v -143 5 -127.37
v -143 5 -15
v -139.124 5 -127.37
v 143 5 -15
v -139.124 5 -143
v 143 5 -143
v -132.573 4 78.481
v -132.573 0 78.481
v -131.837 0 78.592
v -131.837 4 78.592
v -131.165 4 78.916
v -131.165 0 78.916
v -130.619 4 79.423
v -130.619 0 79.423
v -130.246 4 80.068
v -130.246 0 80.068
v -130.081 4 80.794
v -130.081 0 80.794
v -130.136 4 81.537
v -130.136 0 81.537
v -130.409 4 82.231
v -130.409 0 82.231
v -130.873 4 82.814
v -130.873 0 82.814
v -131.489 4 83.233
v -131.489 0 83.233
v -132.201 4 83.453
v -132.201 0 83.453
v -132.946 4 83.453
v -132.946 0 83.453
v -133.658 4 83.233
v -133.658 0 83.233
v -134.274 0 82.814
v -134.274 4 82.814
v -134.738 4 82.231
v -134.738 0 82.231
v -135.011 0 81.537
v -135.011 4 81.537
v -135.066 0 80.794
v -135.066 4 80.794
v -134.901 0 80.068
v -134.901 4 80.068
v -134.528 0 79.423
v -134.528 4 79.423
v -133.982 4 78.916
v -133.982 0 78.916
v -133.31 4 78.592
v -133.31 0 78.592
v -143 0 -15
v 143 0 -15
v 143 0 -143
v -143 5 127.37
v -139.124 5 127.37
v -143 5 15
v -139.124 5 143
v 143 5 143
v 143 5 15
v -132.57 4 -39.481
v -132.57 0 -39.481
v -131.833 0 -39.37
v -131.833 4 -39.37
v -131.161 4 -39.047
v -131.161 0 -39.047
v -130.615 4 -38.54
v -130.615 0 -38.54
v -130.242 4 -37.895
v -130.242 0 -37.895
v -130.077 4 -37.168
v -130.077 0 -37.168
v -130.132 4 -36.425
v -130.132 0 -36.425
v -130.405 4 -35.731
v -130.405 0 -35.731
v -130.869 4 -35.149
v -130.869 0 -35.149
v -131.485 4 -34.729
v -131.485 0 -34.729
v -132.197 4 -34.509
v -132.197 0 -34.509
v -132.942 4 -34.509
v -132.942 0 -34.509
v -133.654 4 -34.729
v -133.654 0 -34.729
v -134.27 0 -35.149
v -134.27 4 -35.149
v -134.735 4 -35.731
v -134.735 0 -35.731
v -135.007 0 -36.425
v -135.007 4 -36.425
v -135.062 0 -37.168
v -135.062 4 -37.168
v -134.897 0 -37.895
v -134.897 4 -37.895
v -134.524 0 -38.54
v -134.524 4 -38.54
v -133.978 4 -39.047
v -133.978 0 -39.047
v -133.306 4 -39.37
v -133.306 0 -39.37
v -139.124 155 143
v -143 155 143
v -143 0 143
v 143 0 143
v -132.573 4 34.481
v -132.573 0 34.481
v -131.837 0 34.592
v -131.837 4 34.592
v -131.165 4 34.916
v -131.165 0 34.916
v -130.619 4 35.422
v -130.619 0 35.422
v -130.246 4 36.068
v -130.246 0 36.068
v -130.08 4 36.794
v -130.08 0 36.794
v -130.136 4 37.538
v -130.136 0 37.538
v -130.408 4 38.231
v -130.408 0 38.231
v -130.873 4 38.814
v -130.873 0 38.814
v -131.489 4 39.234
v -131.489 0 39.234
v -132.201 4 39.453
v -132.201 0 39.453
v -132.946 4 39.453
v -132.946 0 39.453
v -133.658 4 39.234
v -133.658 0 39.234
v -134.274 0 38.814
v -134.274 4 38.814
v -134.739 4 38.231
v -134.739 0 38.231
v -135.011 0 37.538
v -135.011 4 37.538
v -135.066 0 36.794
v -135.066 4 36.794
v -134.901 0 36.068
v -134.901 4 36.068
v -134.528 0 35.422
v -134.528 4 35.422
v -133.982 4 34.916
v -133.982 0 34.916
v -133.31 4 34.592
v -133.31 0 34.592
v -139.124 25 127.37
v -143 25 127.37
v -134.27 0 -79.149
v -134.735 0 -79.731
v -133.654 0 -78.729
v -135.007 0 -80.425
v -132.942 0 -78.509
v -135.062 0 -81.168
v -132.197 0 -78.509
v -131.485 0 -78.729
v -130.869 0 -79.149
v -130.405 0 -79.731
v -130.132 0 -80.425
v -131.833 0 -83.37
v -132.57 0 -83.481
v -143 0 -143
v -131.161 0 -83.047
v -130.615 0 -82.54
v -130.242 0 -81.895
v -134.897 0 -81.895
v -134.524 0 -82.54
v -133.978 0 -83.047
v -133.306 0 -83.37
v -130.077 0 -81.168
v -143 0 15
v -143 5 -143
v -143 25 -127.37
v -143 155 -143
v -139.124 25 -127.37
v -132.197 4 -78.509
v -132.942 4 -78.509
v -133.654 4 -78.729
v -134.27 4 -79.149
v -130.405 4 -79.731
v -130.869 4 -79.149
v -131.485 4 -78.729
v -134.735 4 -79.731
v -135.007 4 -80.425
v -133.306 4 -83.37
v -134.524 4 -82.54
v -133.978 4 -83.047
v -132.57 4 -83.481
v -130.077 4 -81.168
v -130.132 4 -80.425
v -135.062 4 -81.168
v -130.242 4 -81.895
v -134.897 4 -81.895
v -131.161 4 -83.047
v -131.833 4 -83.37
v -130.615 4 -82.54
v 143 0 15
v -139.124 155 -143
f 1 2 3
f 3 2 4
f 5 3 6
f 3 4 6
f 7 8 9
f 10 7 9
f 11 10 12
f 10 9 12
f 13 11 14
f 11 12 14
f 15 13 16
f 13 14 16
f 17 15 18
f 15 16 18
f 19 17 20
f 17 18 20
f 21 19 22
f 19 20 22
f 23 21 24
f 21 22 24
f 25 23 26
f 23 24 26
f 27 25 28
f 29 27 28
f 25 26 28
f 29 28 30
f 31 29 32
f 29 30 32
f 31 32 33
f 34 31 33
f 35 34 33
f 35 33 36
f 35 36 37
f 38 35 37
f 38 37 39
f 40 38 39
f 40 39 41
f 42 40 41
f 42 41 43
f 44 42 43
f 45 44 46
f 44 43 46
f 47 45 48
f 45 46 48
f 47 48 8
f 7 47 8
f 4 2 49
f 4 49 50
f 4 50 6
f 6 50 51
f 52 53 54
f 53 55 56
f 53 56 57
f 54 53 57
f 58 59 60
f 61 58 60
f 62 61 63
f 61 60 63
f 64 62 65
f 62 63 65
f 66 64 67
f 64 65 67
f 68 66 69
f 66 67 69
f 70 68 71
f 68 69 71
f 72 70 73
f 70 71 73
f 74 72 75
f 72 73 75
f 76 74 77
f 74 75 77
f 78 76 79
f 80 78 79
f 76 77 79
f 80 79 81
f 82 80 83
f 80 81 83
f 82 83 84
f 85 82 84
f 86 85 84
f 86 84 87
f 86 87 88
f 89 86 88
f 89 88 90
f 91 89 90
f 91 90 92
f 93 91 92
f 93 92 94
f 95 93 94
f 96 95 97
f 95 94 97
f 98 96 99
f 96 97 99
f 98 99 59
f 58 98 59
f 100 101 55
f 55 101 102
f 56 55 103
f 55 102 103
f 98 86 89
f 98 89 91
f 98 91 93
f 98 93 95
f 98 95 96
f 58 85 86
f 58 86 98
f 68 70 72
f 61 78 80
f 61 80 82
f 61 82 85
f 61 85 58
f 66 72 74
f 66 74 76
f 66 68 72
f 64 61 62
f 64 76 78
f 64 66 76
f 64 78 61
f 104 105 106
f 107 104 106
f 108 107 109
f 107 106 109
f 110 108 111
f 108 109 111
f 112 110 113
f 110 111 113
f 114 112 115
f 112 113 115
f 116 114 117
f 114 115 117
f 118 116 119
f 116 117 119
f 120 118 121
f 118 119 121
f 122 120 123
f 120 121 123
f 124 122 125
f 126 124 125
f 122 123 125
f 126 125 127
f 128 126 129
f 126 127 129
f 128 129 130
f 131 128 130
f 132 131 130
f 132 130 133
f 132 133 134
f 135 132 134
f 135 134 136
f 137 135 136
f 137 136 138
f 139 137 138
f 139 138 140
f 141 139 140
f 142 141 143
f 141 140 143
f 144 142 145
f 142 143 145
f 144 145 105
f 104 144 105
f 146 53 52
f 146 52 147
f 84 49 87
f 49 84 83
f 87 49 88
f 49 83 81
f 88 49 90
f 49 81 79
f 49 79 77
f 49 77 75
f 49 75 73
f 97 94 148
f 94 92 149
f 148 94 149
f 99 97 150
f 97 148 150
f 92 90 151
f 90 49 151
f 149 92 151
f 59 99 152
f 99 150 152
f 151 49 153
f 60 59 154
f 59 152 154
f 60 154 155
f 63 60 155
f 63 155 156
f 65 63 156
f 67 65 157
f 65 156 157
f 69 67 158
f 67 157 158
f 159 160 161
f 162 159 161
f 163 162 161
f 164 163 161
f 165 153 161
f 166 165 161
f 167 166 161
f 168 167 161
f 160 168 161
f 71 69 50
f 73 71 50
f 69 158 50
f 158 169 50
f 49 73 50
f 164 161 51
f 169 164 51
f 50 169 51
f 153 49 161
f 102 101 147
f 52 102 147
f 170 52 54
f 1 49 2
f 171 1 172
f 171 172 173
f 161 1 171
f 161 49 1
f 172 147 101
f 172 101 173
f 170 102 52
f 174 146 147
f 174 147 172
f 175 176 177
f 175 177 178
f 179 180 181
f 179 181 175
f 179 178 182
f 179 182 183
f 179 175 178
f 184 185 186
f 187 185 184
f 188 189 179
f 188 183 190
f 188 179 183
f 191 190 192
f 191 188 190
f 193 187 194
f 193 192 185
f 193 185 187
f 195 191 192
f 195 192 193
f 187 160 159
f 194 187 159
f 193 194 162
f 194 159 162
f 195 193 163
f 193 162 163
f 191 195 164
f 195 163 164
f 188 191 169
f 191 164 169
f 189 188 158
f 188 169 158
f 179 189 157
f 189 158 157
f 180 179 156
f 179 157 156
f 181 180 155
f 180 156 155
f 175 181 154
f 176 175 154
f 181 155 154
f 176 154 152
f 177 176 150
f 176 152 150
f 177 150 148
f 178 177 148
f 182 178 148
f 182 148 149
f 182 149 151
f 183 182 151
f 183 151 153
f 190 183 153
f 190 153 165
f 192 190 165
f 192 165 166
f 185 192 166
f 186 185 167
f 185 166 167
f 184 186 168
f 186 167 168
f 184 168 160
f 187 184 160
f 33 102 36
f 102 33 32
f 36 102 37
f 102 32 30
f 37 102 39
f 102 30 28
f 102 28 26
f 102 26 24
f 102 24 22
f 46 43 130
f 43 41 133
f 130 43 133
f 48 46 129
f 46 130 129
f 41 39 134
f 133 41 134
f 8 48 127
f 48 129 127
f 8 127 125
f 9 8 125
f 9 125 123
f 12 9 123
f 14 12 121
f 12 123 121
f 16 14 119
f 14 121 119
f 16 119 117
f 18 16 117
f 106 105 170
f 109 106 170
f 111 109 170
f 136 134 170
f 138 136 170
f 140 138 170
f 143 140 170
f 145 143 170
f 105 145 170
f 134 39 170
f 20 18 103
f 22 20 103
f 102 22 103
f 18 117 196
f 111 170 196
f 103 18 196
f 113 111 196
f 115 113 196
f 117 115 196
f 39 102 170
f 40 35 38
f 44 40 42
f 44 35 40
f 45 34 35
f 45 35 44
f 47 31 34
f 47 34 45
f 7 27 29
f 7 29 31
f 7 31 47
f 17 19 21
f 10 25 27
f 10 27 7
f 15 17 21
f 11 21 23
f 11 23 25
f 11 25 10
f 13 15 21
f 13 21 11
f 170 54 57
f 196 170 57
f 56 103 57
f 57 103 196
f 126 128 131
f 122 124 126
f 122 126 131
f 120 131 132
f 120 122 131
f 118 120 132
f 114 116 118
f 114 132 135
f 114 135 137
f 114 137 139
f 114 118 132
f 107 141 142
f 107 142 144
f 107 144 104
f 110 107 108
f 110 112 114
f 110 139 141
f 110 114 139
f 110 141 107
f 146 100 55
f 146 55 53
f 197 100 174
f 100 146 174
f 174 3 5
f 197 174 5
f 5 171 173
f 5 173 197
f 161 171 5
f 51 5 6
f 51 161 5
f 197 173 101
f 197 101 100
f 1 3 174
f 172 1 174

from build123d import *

# Parameters (mm, degrees)
SKETCH1_W           = 286
SKETCH1_H           = 286
BOSS_EXTRUDE1_DEPTH = 5
SKETCH4_R           = 2.499853141
SKETCH4_R_2         = 2.499999298
SKETCH4_R_3         = 2.499896797
CUT_EXTRUDE1_DEPTH  = 4
SKETCH5_W           = 286
SKETCH5_H           = 30
CUT_EXTRUDE2_DEPTH  = 203.29434001
SKETCH6_W           = 3.876379433
SKETCH6_H           = 286
BOSS_EXTRUDE2_DEPTH = 150
SKETCH7_W           = 254.74073144
SKETCH7_H           = 20
CUT_EXTRUDE3_DEPTH  = 353.232504579


with BuildPart() as part:
    # Sketch1 → Boss-Extrude1 (new body)
    with BuildSketch(Plane(origin=(0, 0, 0), x_dir=(1, 0, 0), z_dir=(0, 1, 0))):
        Rectangle(SKETCH1_W, SKETCH1_H)
    extrude(amount=BOSS_EXTRUDE1_DEPTH)

    # Sketch4 → Cut-Extrude1 (cut)
    with BuildSketch(Plane(origin=(0, 0, 0), x_dir=(-1, 0, 0), z_dir=(0, -1, 0))):
        with Locations(Location((132.573463178, -80.981198503, 0), (0, 0, 90))):
            Circle(SKETCH4_R)
        with Locations(Location((132.573463178, -36.981198619, 0), (0, 0, 90))):
            Circle(SKETCH4_R_2)
        with Locations(Location((132.569572232, 36.981198719, 0), (0, 0, 90))):
            Circle(SKETCH4_R_3)
        with Locations(Location((132.569572232, 80.981198603, 0), (0, 0, 90))):
            Circle(SKETCH4_R_3)
    extrude(amount=-CUT_EXTRUDE1_DEPTH, mode=Mode.SUBTRACT)

    # Sketch5 → Cut-Extrude2 (cut, through all)
    with BuildSketch(Plane(origin=(0, 5, 0), x_dir=(1, 0, 0), z_dir=(0, 1, 0))):
        Rectangle(SKETCH5_W, SKETCH5_H)
    extrude(amount=-CUT_EXTRUDE2_DEPTH, mode=Mode.SUBTRACT)


with BuildPart() as cut_extrude2_piece_1:
    # of the separate pieces the step leaves, piece 1, a body of its own (cut_extrude2_pieces)
    add(part.part.solids().sort_by_distance((-143, 0, -143))[0])



with BuildPart() as cut_extrude2_piece_2:
    # of the separate pieces the step leaves, piece 2, a body of its own (cut_extrude2_pieces)
    add(part.part.solids().sort_by_distance((-143, 0, 143))[0])


with BuildPart() as cut_extrude2_piece_1_1:
    add(cut_extrude2_piece_1.part)

    add(cut_extrude2_piece_2.part)  # Boss-Extrude2 merges Cut-Extrude2 piece 2
    # Sketch6 → Boss-Extrude2 (add)
    with BuildSketch(Plane(origin=(0, 5, 0), x_dir=(1, 0, 0), z_dir=(0, 1, 0))):
        with Locations((-141.061810283, 0)):
            Rectangle(SKETCH6_W, SKETCH6_H)
    extrude(amount=BOSS_EXTRUDE2_DEPTH)

    # Sketch7 → Cut-Extrude3 (cut, through all)
    with BuildSketch(Plane(origin=(-139.123620567, 0, 0), x_dir=(0, 0, -1), z_dir=(1, 0, 0))):
        with Locations((0, 15)):
            Rectangle(SKETCH7_W, SKETCH7_H)
    extrude(amount=-CUT_EXTRUDE3_DEPTH, mode=Mode.SUBTRACT)


solid = cut_extrude2_piece_1_1.part
